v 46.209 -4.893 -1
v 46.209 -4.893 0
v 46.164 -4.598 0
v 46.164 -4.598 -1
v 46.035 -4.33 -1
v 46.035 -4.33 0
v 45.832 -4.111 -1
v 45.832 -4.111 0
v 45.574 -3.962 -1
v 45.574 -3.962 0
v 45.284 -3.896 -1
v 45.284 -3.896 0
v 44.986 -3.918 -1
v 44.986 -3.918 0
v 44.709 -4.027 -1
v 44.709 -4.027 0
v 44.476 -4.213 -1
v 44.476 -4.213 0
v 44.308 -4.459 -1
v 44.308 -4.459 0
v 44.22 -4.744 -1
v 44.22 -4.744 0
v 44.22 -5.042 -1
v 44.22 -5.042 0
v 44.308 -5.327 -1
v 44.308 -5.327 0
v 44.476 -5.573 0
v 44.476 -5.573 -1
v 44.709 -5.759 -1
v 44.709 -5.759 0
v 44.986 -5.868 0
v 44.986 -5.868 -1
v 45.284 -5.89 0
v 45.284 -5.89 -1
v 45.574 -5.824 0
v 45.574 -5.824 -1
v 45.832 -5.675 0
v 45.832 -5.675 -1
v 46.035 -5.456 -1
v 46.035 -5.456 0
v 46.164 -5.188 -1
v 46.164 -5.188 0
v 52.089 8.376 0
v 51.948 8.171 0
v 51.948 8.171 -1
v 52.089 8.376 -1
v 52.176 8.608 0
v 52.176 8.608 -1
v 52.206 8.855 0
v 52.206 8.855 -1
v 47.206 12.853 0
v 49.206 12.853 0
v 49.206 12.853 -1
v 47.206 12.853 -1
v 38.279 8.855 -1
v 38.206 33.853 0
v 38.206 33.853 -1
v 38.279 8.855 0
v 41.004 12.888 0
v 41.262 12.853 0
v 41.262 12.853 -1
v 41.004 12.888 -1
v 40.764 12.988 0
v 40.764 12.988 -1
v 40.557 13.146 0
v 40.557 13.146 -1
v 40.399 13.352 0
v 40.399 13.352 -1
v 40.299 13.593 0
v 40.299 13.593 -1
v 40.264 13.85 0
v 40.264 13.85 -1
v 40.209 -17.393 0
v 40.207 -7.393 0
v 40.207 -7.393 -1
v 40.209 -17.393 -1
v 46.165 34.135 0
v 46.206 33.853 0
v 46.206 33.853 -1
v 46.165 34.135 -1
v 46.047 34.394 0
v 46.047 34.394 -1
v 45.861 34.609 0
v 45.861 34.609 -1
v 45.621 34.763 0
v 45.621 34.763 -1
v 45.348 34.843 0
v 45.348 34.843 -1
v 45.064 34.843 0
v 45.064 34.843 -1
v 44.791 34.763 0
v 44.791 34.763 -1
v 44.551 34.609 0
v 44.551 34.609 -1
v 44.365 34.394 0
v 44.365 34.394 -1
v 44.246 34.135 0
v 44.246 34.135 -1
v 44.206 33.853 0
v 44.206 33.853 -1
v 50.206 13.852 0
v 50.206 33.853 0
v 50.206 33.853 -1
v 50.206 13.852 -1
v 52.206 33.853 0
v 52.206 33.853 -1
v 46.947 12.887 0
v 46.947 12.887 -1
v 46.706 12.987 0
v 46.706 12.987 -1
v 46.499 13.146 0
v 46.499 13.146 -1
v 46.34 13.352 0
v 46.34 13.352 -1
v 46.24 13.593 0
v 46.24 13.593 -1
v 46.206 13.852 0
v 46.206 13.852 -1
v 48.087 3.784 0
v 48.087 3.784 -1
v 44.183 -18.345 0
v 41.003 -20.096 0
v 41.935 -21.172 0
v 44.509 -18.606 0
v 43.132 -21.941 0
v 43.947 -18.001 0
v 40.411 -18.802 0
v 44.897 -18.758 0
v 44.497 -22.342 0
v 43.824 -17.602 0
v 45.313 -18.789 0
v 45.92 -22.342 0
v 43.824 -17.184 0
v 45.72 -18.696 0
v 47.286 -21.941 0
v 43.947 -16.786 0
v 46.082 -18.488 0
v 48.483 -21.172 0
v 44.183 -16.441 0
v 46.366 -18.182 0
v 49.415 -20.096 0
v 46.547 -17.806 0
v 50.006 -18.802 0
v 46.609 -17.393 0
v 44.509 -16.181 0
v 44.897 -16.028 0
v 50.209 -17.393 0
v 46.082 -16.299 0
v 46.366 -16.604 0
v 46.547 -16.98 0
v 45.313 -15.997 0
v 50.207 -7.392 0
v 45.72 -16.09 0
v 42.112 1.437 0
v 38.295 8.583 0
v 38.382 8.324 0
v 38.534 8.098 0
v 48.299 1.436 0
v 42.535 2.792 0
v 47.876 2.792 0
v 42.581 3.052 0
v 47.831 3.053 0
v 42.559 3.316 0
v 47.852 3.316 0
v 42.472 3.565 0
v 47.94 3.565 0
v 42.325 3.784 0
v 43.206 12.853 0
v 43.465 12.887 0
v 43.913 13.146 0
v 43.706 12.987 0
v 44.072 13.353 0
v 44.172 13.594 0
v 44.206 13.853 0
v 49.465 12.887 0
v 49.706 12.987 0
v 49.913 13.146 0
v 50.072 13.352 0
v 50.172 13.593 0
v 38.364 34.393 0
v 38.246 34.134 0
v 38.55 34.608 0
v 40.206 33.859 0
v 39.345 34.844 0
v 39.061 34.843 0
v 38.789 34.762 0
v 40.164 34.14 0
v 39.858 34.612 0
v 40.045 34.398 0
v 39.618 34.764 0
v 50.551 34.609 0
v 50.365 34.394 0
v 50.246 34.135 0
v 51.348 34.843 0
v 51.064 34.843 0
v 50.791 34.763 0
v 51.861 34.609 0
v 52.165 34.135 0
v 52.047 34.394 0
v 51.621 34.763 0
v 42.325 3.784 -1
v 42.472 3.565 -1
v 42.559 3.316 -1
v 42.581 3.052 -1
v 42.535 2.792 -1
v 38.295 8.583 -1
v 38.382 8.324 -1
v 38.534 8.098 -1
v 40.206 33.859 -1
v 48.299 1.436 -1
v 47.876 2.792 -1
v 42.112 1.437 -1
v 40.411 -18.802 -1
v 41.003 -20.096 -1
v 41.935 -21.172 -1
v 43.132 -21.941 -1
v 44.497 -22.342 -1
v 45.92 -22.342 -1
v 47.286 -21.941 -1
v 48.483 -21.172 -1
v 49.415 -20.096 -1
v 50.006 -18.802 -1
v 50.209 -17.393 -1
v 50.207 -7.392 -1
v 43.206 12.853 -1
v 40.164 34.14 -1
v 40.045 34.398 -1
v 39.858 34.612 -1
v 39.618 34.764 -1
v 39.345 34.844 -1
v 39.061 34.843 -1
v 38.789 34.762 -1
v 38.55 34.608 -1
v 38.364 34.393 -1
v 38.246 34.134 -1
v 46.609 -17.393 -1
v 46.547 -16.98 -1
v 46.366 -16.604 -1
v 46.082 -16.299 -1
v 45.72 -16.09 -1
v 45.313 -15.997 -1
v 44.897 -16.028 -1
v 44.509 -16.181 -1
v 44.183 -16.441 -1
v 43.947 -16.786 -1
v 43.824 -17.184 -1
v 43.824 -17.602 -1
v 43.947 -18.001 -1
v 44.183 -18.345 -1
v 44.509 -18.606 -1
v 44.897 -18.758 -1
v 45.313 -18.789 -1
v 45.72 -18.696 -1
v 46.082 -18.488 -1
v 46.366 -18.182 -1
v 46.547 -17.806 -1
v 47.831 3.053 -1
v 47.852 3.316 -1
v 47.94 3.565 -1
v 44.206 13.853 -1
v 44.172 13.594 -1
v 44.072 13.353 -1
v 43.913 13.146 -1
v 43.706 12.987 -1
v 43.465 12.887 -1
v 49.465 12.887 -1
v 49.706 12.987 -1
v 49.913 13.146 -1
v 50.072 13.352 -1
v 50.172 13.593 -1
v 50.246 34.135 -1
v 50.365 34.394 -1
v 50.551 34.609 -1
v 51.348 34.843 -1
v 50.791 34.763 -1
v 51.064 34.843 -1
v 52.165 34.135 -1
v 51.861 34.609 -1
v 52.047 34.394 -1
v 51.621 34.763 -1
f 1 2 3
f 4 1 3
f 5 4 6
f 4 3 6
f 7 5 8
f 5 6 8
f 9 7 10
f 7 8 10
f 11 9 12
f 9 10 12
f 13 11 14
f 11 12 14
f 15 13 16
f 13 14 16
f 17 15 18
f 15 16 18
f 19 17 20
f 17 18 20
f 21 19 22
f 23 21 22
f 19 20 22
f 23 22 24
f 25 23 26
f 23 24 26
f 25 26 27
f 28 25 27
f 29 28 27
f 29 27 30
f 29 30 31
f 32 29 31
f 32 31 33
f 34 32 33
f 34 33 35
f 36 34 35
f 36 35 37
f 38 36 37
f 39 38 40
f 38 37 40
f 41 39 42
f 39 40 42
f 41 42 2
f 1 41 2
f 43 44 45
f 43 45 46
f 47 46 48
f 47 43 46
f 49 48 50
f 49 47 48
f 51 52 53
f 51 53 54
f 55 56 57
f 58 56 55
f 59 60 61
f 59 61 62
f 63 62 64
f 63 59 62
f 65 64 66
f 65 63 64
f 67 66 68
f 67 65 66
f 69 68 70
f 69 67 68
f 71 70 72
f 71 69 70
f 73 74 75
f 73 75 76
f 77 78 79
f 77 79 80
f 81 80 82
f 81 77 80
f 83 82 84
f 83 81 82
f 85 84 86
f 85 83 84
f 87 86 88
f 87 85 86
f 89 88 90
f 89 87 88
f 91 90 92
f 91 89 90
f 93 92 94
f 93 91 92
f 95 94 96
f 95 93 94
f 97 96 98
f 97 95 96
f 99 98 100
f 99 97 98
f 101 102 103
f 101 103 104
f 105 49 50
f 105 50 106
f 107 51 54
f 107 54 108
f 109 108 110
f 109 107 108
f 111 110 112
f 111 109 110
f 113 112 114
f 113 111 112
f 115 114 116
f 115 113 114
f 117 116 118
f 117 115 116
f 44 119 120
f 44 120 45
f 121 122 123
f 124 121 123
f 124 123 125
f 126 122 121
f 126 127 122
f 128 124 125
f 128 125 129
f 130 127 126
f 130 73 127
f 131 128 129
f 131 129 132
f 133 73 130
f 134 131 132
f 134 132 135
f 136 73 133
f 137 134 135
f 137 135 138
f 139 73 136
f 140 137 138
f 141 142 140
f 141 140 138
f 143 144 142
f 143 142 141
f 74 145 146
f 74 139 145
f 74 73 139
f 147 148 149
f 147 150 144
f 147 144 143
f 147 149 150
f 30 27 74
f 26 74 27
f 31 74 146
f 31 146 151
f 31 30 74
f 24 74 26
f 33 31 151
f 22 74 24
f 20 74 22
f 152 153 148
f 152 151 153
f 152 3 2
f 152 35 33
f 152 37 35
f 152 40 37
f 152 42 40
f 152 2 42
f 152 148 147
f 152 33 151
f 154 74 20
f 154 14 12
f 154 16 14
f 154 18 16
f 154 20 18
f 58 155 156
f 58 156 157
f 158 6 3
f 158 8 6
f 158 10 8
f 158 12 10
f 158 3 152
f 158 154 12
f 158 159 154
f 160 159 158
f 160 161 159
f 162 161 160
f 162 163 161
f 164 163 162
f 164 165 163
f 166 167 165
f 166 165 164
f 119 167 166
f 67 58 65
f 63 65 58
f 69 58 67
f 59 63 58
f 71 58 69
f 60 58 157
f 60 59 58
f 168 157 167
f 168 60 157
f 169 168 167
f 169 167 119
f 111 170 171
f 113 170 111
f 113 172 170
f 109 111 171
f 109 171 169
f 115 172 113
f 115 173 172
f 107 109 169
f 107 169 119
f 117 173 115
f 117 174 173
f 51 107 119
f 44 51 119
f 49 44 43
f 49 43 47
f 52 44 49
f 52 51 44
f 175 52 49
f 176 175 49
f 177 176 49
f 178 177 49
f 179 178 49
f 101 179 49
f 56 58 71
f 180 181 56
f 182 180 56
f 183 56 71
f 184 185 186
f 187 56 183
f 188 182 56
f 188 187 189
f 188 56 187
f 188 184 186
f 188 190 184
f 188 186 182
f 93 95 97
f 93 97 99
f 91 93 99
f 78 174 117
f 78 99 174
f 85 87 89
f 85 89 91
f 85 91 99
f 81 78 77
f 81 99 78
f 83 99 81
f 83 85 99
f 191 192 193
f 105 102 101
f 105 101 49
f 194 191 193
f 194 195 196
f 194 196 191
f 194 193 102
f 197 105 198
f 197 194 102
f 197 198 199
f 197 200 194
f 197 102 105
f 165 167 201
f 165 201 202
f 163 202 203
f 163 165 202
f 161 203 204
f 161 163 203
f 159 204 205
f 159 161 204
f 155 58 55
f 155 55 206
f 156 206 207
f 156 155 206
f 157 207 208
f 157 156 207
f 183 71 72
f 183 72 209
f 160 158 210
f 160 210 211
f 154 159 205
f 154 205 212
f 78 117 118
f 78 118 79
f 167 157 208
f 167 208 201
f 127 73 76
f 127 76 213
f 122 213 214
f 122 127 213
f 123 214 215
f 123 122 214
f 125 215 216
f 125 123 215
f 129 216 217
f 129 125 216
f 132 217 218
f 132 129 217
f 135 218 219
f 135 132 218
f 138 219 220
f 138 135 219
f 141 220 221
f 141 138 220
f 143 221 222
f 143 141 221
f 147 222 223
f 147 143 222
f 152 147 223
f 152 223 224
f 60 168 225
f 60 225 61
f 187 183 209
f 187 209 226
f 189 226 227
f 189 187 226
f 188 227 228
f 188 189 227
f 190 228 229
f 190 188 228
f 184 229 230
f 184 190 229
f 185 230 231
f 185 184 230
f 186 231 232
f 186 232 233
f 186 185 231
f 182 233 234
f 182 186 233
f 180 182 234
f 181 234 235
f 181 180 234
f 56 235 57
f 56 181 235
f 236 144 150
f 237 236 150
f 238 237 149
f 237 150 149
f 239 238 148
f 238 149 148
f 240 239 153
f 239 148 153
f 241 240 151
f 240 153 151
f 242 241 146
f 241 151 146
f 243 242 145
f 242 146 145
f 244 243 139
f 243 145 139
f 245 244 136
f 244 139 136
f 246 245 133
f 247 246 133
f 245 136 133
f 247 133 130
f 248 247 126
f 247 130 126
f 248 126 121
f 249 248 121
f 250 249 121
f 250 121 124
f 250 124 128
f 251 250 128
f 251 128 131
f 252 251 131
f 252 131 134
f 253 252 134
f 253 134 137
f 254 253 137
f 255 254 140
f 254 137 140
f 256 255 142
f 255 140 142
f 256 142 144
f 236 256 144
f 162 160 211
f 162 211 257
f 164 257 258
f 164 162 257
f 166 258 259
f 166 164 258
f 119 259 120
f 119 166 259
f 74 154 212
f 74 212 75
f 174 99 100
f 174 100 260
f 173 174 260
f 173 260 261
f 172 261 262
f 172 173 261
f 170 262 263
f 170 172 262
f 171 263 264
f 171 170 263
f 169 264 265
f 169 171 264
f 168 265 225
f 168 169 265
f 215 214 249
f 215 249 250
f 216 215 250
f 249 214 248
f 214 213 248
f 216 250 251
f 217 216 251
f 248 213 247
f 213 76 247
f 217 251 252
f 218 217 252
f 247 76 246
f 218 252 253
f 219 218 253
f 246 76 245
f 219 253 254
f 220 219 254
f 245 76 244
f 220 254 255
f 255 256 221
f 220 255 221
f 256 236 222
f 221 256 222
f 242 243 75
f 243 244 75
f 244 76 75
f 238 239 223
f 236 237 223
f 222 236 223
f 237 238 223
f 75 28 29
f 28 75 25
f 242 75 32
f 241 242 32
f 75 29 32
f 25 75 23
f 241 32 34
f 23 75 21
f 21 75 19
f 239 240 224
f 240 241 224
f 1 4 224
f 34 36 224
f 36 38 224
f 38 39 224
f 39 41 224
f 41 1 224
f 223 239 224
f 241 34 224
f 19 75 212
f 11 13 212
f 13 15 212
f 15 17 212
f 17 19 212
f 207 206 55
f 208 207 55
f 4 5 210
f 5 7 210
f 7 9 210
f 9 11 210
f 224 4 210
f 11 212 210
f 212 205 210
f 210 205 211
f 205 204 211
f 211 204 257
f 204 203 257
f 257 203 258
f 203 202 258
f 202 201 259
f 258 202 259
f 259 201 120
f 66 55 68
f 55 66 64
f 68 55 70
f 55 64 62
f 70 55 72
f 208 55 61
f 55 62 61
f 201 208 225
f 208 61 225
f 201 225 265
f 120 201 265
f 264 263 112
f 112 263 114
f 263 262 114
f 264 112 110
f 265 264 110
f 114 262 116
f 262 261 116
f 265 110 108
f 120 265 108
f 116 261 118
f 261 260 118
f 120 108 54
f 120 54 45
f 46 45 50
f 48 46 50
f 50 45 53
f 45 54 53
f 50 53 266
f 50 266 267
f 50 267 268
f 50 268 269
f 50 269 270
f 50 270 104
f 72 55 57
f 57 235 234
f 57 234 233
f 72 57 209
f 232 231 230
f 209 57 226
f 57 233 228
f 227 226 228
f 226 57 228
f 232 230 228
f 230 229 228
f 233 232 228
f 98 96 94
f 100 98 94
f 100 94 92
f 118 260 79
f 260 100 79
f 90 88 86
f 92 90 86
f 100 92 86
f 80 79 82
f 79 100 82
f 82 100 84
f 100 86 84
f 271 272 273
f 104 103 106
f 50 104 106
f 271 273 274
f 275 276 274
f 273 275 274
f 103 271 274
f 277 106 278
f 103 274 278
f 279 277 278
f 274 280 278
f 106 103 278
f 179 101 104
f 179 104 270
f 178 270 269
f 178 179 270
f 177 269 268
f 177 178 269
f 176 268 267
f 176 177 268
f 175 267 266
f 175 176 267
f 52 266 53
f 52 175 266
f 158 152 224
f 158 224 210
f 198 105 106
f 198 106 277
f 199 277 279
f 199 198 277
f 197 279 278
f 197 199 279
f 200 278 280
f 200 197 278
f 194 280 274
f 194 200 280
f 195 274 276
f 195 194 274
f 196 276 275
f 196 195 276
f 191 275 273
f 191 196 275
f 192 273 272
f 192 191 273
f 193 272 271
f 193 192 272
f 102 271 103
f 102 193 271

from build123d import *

# Parameters (mm, degrees)
MODEL_R           = 1.4
MODEL_R_2         = 1
BRIDA_BASE1_DEPTH = 1


# Sheet-metal steps are written as plain solids
with BuildPart() as part:
    # Model → Brida base1 (new body)
    with BuildSketch(Plane.XY):
        with BuildLine():
            Line((50.207437074, -7.391699149), (48.298711017, 1.436394934))
            Line((48.298711017, 1.436394934), (47.876387864, 2.792489658))
            ThreePointArc((47.876387864, 2.792489658), (47.852286656, 3.315621633), (48.087445951, 3.783540469))
            Line((48.087445951, 3.783540469), (51.948138549, 8.171489457))
            ThreePointArc((51.948138549, 8.171489457), (52.139383389, 8.489686819), (52.2059904, 8.854909567))
            Line((52.2059904, 8.854909567), (52.2059904, 33.853262145))
            ThreePointArc((52.2059904, 33.853262145), (51.2059904, 34.853262145), (50.2059904, 33.853262145))
            Line((50.2059904, 33.853262145), (50.2059904, 13.851710132))
            ThreePointArc((50.2059904, 13.851710132), (49.912550656, 13.14560465), (49.205991599, 12.853258732))
            Line((49.205991599, 12.853258732), (47.205989201, 12.853258732))
            ThreePointArc((47.205989201, 12.853258732), (46.499430144, 13.14560465), (46.2059904, 13.851710132))
            Line((46.2059904, 13.851710132), (46.2059904, 33.853262145))
            ThreePointArc((46.2059904, 33.853262145), (45.2059904, 34.853262145), (44.2059904, 33.853262145))
            Line((44.2059904, 33.853262145), (44.2059904, 13.853262145))
            ThreePointArc((44.2059904, 13.853262145), (43.913097181, 13.146155364), (43.2059904, 12.853262145))
            Line((43.2059904, 12.853262145), (41.261682565, 12.853262145))
            ThreePointArc((41.261682565, 12.853262145), (40.55729517, 13.146045419), (40.26429965, 13.850344556))
            Line((40.26429965, 13.850344556), (40.2059904, 33.859090521))
            ThreePointArc((40.2059904, 33.859090521), (39.203084692, 34.853266391), (38.2059904, 33.853262145))
            Line((38.2059904, 33.853262145), (38.278848795, 8.854909567))
            ThreePointArc((38.278848795, 8.854909567), (38.330209967, 8.450786945), (38.53359758, 8.097818756))
            Line((38.53359758, 8.097818756), (42.324534849, 3.783540469))
            ThreePointArc((42.324534849, 3.783540469), (42.559377318, 3.315539648), (42.534995737, 2.792489658))
            Line((42.534995737, 2.792489658), (42.111984195, 1.436609508))
            Line((42.111984195, 1.436609508), (40.20743717, -7.393077864))
            Line((40.20743717, -7.393077864), (40.208815885, -17.393077769))
            ThreePointArc((40.208815885, -17.393077769), (45.208815932, -22.393077817), (50.20881598, -17.393077769))
            Line((50.20881598, -17.393077769), (50.207437074, -7.391699149))
        make_face()
        with Locations((45.208815932, -17.393077769)):
            Circle(MODEL_R, mode=Mode.SUBTRACT)
        with Locations((45.208815932, -4.893077769)):
            Circle(MODEL_R_2, mode=Mode.SUBTRACT)
    extrude(amount=-BRIDA_BASE1_DEPTH)


solid = part.part
